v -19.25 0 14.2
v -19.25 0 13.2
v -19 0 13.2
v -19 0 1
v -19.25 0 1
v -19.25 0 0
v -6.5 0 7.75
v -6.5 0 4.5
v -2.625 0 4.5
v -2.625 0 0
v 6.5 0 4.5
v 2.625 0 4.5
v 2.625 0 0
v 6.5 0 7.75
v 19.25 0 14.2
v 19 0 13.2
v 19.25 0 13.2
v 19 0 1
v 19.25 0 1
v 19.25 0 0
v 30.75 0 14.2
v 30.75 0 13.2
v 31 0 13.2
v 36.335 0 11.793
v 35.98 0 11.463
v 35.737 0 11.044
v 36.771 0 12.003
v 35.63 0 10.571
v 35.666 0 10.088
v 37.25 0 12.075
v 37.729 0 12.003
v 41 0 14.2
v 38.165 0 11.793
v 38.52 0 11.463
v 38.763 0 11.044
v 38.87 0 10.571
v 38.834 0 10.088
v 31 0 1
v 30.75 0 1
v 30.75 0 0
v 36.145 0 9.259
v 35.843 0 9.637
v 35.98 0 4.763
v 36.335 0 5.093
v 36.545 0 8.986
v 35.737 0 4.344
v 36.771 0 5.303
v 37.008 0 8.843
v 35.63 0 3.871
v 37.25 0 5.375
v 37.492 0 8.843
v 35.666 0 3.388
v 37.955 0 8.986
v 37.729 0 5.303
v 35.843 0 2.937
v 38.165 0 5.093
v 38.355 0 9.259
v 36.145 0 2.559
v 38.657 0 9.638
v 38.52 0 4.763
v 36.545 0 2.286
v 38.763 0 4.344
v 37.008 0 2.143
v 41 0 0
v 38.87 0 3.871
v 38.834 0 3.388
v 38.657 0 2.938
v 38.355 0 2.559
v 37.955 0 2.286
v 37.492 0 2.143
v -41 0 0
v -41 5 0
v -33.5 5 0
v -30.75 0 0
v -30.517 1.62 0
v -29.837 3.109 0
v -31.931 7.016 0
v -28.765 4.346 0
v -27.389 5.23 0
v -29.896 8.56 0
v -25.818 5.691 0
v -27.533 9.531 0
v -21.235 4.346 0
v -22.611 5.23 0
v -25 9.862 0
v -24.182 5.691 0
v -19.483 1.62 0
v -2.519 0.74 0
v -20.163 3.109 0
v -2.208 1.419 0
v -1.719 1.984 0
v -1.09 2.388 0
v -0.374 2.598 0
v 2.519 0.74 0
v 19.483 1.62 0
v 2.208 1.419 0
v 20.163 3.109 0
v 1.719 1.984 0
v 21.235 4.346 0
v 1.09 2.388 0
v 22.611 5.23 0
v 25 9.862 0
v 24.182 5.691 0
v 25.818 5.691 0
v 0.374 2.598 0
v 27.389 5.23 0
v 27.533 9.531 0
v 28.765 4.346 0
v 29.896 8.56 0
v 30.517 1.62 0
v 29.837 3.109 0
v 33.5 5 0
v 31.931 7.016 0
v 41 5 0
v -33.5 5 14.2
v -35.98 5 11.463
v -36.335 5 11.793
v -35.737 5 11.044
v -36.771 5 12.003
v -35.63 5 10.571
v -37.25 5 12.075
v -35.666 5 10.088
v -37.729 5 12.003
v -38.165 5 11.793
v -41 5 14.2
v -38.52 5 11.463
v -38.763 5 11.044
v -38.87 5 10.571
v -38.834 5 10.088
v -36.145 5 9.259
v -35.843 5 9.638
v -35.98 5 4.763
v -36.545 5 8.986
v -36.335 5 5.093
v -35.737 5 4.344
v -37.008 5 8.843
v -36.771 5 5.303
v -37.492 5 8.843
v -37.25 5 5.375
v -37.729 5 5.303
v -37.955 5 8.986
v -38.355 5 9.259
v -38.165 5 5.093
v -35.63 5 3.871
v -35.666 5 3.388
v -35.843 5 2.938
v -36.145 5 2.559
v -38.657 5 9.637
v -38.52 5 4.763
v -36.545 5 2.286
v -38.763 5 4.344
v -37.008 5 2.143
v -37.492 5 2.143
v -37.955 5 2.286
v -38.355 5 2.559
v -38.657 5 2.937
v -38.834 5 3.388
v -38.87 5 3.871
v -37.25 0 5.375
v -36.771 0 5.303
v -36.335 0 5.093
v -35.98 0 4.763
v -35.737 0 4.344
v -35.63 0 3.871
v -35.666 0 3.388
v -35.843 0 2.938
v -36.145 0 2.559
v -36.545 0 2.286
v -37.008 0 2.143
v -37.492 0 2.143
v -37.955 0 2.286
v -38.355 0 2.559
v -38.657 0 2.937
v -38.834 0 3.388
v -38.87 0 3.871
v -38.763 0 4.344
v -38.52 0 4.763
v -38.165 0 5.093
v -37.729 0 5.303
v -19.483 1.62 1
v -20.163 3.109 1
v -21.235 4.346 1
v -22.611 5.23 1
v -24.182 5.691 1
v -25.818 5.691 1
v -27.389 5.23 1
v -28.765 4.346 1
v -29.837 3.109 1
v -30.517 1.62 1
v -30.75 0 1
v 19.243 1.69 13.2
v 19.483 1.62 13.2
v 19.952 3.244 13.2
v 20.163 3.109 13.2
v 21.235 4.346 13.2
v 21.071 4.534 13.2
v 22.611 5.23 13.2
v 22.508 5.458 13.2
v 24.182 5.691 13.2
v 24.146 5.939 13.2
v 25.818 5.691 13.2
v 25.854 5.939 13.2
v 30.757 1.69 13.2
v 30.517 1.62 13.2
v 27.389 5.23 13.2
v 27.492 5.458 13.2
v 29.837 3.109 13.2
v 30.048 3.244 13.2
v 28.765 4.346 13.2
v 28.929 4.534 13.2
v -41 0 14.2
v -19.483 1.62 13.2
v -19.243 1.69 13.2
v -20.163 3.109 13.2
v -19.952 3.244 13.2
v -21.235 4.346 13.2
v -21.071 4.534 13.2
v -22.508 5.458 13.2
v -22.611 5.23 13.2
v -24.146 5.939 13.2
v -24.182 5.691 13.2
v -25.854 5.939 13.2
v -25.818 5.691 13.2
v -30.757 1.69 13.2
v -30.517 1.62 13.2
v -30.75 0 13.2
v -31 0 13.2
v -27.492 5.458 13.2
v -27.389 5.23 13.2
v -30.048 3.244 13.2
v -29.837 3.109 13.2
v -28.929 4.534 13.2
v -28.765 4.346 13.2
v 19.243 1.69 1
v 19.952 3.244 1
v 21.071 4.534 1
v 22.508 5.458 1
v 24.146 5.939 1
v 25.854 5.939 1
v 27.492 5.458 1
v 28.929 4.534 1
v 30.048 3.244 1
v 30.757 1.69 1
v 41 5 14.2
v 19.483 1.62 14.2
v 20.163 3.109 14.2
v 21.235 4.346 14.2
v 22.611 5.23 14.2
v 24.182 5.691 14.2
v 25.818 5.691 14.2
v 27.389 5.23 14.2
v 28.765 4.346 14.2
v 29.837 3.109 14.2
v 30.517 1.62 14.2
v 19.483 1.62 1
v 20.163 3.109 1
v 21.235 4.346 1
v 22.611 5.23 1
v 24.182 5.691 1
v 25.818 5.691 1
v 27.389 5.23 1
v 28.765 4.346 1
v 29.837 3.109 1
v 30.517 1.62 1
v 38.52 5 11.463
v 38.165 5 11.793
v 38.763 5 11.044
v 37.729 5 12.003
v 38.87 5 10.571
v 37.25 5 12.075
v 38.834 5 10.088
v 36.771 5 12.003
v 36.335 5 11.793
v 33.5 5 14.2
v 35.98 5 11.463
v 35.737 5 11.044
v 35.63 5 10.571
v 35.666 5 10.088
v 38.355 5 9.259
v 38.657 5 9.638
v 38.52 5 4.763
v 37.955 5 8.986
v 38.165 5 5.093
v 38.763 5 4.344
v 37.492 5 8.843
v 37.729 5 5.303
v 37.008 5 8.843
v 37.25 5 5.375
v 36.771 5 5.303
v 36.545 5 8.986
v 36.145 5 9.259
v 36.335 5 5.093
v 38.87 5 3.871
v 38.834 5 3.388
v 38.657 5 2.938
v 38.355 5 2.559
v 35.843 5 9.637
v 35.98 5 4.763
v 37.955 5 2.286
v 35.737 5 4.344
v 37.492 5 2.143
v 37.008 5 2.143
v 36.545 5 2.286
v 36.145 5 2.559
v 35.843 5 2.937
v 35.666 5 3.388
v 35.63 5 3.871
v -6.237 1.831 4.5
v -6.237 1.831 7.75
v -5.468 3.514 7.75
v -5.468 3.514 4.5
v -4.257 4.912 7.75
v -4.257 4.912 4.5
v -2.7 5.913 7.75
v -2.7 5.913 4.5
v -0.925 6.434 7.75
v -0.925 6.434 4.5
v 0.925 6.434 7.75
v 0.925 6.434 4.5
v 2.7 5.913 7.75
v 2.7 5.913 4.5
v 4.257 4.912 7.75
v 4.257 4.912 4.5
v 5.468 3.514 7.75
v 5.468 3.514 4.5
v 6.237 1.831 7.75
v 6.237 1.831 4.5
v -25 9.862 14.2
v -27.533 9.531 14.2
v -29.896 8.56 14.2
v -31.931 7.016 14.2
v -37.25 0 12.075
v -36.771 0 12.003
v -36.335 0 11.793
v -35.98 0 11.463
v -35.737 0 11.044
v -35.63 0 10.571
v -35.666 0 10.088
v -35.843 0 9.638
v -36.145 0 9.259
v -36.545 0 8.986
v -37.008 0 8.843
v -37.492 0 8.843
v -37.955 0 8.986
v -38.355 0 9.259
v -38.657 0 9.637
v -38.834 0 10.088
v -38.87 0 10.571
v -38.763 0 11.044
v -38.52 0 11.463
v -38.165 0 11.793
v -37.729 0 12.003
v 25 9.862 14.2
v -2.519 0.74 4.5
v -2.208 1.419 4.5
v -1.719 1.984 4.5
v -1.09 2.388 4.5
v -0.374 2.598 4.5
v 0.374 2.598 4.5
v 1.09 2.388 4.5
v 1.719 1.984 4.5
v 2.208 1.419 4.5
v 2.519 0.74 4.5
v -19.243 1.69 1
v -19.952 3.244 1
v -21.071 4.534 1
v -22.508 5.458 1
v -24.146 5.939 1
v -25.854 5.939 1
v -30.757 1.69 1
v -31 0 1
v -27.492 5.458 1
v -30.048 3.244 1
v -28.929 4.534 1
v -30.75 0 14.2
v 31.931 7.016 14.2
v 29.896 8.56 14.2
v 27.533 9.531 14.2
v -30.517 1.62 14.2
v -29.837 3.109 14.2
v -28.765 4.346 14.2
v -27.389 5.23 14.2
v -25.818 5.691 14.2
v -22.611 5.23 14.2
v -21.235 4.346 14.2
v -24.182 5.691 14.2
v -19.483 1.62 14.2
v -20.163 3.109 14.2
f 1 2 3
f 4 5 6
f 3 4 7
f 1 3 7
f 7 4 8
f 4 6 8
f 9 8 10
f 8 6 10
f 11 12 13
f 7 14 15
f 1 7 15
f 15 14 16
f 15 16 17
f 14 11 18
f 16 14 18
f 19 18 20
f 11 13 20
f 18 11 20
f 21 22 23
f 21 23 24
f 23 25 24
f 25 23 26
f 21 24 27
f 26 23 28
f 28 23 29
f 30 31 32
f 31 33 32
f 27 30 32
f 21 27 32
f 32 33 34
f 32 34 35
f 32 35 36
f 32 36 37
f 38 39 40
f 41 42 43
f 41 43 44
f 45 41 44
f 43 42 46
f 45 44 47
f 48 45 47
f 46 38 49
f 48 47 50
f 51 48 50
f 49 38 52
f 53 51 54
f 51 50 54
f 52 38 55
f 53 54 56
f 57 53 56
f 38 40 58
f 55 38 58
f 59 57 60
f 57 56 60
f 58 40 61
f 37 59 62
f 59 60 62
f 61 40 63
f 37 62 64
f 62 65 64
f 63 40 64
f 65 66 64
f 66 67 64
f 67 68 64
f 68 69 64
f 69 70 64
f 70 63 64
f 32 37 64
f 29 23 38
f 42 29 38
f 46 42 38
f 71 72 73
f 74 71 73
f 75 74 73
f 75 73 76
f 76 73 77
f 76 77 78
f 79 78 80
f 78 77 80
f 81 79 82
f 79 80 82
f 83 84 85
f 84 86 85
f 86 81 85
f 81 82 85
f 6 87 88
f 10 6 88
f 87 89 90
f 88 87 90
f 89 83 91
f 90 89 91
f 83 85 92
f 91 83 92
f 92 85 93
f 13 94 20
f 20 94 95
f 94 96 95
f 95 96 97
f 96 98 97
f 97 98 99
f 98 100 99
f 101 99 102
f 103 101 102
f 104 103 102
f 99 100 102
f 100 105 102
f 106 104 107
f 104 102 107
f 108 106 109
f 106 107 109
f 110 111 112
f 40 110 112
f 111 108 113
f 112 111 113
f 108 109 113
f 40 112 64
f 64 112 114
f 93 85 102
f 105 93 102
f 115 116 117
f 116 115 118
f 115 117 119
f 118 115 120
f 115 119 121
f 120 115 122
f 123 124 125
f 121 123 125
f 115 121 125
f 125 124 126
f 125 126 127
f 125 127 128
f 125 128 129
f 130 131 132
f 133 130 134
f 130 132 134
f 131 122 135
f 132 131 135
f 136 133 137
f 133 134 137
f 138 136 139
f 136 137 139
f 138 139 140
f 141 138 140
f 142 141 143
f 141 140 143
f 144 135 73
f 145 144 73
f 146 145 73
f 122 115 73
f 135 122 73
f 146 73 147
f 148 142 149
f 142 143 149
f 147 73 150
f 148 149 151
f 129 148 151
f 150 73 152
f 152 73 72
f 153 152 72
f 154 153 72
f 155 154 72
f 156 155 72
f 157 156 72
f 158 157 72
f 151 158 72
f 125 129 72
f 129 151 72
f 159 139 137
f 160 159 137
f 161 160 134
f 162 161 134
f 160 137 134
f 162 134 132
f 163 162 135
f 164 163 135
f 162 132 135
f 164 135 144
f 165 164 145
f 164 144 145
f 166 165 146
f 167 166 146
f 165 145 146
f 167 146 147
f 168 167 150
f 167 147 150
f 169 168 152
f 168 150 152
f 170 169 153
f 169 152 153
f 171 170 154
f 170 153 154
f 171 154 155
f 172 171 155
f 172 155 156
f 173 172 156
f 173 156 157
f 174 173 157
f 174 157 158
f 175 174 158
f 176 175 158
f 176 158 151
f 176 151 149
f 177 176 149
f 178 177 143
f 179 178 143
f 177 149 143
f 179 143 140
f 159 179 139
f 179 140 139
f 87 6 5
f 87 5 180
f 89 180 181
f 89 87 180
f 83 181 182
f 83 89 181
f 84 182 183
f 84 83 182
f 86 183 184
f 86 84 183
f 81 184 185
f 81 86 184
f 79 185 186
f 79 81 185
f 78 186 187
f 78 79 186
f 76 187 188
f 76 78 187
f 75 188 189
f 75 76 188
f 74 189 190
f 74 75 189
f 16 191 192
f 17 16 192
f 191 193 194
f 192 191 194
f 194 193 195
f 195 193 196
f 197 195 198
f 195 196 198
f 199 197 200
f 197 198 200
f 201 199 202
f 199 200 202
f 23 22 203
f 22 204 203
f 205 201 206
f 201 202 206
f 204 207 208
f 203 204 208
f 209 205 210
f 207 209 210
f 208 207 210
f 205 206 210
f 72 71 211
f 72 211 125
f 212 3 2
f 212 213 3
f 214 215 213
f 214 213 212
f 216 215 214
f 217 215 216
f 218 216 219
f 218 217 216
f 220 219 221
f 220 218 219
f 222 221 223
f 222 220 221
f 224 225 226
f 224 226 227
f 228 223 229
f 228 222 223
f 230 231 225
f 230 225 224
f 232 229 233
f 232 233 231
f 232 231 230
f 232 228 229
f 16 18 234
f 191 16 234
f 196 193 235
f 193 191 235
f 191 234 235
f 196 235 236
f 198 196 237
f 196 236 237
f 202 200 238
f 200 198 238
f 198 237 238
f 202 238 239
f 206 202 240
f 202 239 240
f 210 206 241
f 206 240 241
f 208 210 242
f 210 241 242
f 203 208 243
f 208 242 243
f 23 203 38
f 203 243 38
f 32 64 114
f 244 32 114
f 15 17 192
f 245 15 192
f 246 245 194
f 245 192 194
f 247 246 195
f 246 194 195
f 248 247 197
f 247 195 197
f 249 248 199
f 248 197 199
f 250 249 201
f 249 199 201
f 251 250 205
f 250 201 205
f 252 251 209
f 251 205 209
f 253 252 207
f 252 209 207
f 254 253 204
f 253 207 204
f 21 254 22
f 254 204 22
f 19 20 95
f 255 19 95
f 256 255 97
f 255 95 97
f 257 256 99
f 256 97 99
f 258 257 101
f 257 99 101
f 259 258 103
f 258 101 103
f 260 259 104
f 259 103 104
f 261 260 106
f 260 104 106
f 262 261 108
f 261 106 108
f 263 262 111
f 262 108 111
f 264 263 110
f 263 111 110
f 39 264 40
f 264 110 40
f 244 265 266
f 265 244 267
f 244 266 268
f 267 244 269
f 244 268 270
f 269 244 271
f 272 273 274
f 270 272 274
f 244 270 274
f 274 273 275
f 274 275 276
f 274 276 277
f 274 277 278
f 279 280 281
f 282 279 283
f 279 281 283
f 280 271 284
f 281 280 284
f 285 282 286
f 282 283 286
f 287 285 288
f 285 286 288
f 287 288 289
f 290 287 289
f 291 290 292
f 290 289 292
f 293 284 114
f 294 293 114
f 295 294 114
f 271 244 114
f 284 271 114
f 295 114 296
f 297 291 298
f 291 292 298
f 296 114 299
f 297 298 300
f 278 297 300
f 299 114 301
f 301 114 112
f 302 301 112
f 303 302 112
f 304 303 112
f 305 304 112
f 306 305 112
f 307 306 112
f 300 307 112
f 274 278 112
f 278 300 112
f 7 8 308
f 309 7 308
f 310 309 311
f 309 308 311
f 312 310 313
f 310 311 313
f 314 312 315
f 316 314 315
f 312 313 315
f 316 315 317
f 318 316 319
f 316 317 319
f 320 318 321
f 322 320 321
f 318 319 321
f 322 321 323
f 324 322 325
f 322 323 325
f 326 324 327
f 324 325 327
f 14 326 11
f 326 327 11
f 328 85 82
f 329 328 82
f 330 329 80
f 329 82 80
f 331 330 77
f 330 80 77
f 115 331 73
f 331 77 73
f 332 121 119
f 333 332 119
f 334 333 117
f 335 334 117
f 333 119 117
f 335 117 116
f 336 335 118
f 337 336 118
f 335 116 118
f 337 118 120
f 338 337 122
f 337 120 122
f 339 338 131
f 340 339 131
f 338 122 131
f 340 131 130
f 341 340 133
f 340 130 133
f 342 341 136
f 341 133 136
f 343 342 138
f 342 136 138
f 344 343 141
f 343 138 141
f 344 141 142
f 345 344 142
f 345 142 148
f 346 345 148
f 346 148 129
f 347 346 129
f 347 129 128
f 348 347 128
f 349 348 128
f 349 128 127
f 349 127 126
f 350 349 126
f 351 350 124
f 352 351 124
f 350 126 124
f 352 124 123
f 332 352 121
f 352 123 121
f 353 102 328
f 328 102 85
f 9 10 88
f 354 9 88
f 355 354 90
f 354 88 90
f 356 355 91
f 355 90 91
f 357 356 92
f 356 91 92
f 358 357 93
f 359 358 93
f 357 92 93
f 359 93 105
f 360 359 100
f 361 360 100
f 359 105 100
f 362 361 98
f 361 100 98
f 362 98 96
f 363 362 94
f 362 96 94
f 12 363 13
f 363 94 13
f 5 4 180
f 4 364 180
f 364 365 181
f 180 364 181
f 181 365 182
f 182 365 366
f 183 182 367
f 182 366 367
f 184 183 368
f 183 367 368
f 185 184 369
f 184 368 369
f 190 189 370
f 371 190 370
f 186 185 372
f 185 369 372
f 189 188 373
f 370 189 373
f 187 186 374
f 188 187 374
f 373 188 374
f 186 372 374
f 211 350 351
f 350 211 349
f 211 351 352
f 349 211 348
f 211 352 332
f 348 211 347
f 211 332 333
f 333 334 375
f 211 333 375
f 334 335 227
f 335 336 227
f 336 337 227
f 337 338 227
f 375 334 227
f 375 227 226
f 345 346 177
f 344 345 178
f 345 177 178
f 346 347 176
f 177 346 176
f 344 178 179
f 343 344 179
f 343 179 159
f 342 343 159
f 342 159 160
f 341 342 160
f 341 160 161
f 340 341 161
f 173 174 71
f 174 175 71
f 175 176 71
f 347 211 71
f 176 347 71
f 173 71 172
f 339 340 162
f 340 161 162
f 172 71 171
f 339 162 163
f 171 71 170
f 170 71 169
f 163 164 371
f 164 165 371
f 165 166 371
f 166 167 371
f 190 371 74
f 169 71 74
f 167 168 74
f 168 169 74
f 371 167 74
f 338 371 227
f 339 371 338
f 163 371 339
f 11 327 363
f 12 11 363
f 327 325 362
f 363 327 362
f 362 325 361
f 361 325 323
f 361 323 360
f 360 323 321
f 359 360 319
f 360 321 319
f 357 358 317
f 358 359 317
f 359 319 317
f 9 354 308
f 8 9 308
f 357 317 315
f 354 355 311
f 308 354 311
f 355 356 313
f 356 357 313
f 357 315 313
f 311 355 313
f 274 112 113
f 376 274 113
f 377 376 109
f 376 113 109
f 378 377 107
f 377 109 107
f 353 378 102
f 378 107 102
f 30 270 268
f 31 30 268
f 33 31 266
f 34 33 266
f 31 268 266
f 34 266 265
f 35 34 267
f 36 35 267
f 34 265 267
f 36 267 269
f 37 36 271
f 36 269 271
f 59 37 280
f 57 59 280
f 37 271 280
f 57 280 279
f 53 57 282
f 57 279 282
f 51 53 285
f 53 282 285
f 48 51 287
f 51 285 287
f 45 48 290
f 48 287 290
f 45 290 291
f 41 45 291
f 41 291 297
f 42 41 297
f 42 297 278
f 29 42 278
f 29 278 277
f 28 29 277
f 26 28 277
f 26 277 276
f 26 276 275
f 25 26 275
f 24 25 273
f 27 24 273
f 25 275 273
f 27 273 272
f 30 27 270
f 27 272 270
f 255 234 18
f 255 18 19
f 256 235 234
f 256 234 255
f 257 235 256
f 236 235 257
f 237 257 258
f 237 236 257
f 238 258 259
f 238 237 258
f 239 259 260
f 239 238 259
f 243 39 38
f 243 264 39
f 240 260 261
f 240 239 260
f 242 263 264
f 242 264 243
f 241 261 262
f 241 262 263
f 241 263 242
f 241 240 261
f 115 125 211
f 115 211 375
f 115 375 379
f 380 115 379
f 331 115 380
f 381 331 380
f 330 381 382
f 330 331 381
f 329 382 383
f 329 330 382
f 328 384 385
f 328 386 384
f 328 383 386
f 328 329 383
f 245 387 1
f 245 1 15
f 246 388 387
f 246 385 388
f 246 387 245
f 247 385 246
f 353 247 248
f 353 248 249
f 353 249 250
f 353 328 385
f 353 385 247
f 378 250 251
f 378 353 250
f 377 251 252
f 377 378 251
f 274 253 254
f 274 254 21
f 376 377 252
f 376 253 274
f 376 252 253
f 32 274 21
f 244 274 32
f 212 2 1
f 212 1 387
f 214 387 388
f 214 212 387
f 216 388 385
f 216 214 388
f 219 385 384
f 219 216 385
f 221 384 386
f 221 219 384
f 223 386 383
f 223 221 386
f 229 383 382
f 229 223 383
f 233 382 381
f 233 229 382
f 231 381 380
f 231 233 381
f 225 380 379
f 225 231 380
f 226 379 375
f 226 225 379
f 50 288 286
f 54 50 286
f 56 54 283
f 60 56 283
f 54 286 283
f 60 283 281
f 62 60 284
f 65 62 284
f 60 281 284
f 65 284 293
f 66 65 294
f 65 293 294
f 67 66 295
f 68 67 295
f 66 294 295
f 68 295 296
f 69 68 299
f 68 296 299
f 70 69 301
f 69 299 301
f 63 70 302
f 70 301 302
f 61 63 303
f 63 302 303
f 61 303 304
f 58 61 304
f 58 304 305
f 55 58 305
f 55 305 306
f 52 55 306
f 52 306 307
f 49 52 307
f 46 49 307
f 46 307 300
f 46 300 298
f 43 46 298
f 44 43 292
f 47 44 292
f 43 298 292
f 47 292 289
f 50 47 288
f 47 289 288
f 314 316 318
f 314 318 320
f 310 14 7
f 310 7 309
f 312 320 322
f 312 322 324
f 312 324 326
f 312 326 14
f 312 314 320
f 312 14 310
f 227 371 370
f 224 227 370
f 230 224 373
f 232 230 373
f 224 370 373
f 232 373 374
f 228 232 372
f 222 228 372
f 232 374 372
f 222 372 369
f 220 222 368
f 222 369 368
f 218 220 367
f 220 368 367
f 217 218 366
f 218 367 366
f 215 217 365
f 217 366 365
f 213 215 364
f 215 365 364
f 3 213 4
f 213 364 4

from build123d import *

# Parameters (mm, degrees)
SKETCH1_W           = 82
SKETCH1_H           = 25
BOSS_EXTRUDE1_DEPTH = 14.2
CUT_EXTRUDE3_DEPTH  = 14.2
BOSS_EXTRUDE2_DEPTH = 1
BOSS_EXTRUDE3_START = -13.2
BOSS_EXTRUDE3_DEPTH = 1
CUT_EXTRUDE4_START  = -4.5
CUT_EXTRUDE4_DEPTH  = 3.25
CUT_EXTRUDE5_DEPTH  = 4.5
CUT_EXTRUDE6_DEPTH  = 14.2
SKETCH8_R           = 1.625
CUT_EXTRUDE7_DEPTH  = 5


with BuildPart() as part:
    # Sketch1 → Boss-Extrude1 (new body)
    with BuildSketch(Plane.XY):
        with Locations((0, 12.5)):
            Rectangle(SKETCH1_W, SKETCH1_H)
    extrude(amount=BOSS_EXTRUDE1_DEPTH)

    # Sketch2 → Cut-Extrude3 (cut)
    with BuildSketch(Plane(origin=(0, 0, 0), x_dir=(-1, 0, 0), z_dir=(0, 0, -1))):
        with BuildLine():
            Line((-31, 0), (-19, 0))
            ThreePointArc((-19, 0), (-25, 6), (-31, 0))
        make_face()
        with BuildLine():
            Line((19, 0), (31, 0))
            ThreePointArc((31, 0), (25, 6), (19, 0))
        make_face()
    extrude(amount=-CUT_EXTRUDE3_DEPTH, mode=Mode.SUBTRACT)

    # Sketch4 → Boss-Extrude2 (add)
    with BuildSketch(Plane(origin=(0, 0, 0), x_dir=(-1, 0, 0), z_dir=(0, 0, -1))):
        with BuildLine():
            Line((-30.75, 0), (-31, 0))
            ThreePointArc((-31, 0), (-25, 6), (-19, 0))
            Line((-19, 0), (-19.25, 0))
            ThreePointArc((-19.25, 0), (-25, 5.75), (-30.75, 0))
        make_face()
        with BuildLine():
            Line((19, 0), (19.25, 0))
            ThreePointArc((19.25, 0), (25, 5.75), (30.75, 0))
            Line((30.75, 0), (31, 0))
            ThreePointArc((31, 0), (25, 6), (19, 0))
        make_face()
    extrude(amount=-BOSS_EXTRUDE2_DEPTH)

    # Sketch4<2> → Boss-Extrude3 (add)
    with BuildSketch(Plane(origin=(0, 0, 0), x_dir=(-1, 0, 0), z_dir=(0, 0, -1)).offset(BOSS_EXTRUDE3_START)):
        with BuildLine():
            Line((-30.75, 0), (-31, 0))
            ThreePointArc((-31, 0), (-25, 6), (-19, 0))
            Line((-19, 0), (-19.25, 0))
            ThreePointArc((-19.25, 0), (-25, 5.75), (-30.75, 0))
        make_face()
        with BuildLine():
            Line((19, 0), (19.25, 0))
            ThreePointArc((19.25, 0), (25, 5.75), (30.75, 0))
            Line((30.75, 0), (31, 0))
            ThreePointArc((31, 0), (25, 6), (19, 0))
        make_face()
    extrude(amount=-BOSS_EXTRUDE3_DEPTH)

    # Sketch5 → Cut-Extrude4 (cut)
    with BuildSketch(Plane(origin=(0, 0, 0), x_dir=(-1, 0, 0), z_dir=(0, 0, -1)).offset(CUT_EXTRUDE4_START)):
        with BuildLine():
            Line((-6.5, 0), (6.5, 0))
            ThreePointArc((6.5, 0), (0, 6.5), (-6.5, 0))
        make_face()
    extrude(amount=-CUT_EXTRUDE4_DEPTH, mode=Mode.SUBTRACT)

    # Sketch6 → Cut-Extrude5 (cut)
    with BuildSketch(Plane(origin=(0, 0, 0), x_dir=(-1, 0, 0), z_dir=(0, 0, -1))):
        with BuildLine():
            Line((-2.625, 0), (2.625, 0))
            ThreePointArc((2.625, 0), (0, 2.625), (-2.625, 0))
        make_face()
    extrude(amount=-CUT_EXTRUDE5_DEPTH, mode=Mode.SUBTRACT)

    # Sketch7 → Cut-Extrude6 (cut)
    with BuildSketch(Plane(origin=(0, 0, 0), x_dir=(-1, 0, 0), z_dir=(0, 0, -1))):
        with BuildLine():
            Line((-41, 5), (-33.5, 5))
            ThreePointArc((-33.5, 5), (-29.896033736, 8.560306867), (-25, 9.861541462))
            Line((-25, 9.861541462), (25, 9.861541462))
            ThreePointArc((25, 9.861541462), (29.896033736, 8.560306867), (33.5, 5))
            Line((33.5, 5), (41, 5))
            Line((41, 5), (41, 25))
            Line((41, 25), (-41, 25))
            Line((-41, 25), (-41, 5))
        make_face()
    extrude(amount=-CUT_EXTRUDE6_DEPTH, mode=Mode.SUBTRACT)

    # Sketch8 → Cut-Extrude7 (cut)
    with BuildSketch(Plane(origin=(0, 5, 0), x_dir=(1, 0, 0), z_dir=(0, 1, 0))):
        with Locations(Location((37.25, -3.75, 0), (0, 0, 270))):
            Circle(SKETCH8_R)
        with Locations(Location((37.25, -10.45, 0), (0, 0, 270))):
            Circle(SKETCH8_R)
        with Locations(Location((-37.25, -3.75, 0), (0, 0, 270))):
            Circle(SKETCH8_R)
        with Locations(Location((-37.25, -10.45, 0), (0, 0, 270))):
            Circle(SKETCH8_R)
    extrude(amount=-CUT_EXTRUDE7_DEPTH, mode=Mode.SUBTRACT)


solid = part.part
